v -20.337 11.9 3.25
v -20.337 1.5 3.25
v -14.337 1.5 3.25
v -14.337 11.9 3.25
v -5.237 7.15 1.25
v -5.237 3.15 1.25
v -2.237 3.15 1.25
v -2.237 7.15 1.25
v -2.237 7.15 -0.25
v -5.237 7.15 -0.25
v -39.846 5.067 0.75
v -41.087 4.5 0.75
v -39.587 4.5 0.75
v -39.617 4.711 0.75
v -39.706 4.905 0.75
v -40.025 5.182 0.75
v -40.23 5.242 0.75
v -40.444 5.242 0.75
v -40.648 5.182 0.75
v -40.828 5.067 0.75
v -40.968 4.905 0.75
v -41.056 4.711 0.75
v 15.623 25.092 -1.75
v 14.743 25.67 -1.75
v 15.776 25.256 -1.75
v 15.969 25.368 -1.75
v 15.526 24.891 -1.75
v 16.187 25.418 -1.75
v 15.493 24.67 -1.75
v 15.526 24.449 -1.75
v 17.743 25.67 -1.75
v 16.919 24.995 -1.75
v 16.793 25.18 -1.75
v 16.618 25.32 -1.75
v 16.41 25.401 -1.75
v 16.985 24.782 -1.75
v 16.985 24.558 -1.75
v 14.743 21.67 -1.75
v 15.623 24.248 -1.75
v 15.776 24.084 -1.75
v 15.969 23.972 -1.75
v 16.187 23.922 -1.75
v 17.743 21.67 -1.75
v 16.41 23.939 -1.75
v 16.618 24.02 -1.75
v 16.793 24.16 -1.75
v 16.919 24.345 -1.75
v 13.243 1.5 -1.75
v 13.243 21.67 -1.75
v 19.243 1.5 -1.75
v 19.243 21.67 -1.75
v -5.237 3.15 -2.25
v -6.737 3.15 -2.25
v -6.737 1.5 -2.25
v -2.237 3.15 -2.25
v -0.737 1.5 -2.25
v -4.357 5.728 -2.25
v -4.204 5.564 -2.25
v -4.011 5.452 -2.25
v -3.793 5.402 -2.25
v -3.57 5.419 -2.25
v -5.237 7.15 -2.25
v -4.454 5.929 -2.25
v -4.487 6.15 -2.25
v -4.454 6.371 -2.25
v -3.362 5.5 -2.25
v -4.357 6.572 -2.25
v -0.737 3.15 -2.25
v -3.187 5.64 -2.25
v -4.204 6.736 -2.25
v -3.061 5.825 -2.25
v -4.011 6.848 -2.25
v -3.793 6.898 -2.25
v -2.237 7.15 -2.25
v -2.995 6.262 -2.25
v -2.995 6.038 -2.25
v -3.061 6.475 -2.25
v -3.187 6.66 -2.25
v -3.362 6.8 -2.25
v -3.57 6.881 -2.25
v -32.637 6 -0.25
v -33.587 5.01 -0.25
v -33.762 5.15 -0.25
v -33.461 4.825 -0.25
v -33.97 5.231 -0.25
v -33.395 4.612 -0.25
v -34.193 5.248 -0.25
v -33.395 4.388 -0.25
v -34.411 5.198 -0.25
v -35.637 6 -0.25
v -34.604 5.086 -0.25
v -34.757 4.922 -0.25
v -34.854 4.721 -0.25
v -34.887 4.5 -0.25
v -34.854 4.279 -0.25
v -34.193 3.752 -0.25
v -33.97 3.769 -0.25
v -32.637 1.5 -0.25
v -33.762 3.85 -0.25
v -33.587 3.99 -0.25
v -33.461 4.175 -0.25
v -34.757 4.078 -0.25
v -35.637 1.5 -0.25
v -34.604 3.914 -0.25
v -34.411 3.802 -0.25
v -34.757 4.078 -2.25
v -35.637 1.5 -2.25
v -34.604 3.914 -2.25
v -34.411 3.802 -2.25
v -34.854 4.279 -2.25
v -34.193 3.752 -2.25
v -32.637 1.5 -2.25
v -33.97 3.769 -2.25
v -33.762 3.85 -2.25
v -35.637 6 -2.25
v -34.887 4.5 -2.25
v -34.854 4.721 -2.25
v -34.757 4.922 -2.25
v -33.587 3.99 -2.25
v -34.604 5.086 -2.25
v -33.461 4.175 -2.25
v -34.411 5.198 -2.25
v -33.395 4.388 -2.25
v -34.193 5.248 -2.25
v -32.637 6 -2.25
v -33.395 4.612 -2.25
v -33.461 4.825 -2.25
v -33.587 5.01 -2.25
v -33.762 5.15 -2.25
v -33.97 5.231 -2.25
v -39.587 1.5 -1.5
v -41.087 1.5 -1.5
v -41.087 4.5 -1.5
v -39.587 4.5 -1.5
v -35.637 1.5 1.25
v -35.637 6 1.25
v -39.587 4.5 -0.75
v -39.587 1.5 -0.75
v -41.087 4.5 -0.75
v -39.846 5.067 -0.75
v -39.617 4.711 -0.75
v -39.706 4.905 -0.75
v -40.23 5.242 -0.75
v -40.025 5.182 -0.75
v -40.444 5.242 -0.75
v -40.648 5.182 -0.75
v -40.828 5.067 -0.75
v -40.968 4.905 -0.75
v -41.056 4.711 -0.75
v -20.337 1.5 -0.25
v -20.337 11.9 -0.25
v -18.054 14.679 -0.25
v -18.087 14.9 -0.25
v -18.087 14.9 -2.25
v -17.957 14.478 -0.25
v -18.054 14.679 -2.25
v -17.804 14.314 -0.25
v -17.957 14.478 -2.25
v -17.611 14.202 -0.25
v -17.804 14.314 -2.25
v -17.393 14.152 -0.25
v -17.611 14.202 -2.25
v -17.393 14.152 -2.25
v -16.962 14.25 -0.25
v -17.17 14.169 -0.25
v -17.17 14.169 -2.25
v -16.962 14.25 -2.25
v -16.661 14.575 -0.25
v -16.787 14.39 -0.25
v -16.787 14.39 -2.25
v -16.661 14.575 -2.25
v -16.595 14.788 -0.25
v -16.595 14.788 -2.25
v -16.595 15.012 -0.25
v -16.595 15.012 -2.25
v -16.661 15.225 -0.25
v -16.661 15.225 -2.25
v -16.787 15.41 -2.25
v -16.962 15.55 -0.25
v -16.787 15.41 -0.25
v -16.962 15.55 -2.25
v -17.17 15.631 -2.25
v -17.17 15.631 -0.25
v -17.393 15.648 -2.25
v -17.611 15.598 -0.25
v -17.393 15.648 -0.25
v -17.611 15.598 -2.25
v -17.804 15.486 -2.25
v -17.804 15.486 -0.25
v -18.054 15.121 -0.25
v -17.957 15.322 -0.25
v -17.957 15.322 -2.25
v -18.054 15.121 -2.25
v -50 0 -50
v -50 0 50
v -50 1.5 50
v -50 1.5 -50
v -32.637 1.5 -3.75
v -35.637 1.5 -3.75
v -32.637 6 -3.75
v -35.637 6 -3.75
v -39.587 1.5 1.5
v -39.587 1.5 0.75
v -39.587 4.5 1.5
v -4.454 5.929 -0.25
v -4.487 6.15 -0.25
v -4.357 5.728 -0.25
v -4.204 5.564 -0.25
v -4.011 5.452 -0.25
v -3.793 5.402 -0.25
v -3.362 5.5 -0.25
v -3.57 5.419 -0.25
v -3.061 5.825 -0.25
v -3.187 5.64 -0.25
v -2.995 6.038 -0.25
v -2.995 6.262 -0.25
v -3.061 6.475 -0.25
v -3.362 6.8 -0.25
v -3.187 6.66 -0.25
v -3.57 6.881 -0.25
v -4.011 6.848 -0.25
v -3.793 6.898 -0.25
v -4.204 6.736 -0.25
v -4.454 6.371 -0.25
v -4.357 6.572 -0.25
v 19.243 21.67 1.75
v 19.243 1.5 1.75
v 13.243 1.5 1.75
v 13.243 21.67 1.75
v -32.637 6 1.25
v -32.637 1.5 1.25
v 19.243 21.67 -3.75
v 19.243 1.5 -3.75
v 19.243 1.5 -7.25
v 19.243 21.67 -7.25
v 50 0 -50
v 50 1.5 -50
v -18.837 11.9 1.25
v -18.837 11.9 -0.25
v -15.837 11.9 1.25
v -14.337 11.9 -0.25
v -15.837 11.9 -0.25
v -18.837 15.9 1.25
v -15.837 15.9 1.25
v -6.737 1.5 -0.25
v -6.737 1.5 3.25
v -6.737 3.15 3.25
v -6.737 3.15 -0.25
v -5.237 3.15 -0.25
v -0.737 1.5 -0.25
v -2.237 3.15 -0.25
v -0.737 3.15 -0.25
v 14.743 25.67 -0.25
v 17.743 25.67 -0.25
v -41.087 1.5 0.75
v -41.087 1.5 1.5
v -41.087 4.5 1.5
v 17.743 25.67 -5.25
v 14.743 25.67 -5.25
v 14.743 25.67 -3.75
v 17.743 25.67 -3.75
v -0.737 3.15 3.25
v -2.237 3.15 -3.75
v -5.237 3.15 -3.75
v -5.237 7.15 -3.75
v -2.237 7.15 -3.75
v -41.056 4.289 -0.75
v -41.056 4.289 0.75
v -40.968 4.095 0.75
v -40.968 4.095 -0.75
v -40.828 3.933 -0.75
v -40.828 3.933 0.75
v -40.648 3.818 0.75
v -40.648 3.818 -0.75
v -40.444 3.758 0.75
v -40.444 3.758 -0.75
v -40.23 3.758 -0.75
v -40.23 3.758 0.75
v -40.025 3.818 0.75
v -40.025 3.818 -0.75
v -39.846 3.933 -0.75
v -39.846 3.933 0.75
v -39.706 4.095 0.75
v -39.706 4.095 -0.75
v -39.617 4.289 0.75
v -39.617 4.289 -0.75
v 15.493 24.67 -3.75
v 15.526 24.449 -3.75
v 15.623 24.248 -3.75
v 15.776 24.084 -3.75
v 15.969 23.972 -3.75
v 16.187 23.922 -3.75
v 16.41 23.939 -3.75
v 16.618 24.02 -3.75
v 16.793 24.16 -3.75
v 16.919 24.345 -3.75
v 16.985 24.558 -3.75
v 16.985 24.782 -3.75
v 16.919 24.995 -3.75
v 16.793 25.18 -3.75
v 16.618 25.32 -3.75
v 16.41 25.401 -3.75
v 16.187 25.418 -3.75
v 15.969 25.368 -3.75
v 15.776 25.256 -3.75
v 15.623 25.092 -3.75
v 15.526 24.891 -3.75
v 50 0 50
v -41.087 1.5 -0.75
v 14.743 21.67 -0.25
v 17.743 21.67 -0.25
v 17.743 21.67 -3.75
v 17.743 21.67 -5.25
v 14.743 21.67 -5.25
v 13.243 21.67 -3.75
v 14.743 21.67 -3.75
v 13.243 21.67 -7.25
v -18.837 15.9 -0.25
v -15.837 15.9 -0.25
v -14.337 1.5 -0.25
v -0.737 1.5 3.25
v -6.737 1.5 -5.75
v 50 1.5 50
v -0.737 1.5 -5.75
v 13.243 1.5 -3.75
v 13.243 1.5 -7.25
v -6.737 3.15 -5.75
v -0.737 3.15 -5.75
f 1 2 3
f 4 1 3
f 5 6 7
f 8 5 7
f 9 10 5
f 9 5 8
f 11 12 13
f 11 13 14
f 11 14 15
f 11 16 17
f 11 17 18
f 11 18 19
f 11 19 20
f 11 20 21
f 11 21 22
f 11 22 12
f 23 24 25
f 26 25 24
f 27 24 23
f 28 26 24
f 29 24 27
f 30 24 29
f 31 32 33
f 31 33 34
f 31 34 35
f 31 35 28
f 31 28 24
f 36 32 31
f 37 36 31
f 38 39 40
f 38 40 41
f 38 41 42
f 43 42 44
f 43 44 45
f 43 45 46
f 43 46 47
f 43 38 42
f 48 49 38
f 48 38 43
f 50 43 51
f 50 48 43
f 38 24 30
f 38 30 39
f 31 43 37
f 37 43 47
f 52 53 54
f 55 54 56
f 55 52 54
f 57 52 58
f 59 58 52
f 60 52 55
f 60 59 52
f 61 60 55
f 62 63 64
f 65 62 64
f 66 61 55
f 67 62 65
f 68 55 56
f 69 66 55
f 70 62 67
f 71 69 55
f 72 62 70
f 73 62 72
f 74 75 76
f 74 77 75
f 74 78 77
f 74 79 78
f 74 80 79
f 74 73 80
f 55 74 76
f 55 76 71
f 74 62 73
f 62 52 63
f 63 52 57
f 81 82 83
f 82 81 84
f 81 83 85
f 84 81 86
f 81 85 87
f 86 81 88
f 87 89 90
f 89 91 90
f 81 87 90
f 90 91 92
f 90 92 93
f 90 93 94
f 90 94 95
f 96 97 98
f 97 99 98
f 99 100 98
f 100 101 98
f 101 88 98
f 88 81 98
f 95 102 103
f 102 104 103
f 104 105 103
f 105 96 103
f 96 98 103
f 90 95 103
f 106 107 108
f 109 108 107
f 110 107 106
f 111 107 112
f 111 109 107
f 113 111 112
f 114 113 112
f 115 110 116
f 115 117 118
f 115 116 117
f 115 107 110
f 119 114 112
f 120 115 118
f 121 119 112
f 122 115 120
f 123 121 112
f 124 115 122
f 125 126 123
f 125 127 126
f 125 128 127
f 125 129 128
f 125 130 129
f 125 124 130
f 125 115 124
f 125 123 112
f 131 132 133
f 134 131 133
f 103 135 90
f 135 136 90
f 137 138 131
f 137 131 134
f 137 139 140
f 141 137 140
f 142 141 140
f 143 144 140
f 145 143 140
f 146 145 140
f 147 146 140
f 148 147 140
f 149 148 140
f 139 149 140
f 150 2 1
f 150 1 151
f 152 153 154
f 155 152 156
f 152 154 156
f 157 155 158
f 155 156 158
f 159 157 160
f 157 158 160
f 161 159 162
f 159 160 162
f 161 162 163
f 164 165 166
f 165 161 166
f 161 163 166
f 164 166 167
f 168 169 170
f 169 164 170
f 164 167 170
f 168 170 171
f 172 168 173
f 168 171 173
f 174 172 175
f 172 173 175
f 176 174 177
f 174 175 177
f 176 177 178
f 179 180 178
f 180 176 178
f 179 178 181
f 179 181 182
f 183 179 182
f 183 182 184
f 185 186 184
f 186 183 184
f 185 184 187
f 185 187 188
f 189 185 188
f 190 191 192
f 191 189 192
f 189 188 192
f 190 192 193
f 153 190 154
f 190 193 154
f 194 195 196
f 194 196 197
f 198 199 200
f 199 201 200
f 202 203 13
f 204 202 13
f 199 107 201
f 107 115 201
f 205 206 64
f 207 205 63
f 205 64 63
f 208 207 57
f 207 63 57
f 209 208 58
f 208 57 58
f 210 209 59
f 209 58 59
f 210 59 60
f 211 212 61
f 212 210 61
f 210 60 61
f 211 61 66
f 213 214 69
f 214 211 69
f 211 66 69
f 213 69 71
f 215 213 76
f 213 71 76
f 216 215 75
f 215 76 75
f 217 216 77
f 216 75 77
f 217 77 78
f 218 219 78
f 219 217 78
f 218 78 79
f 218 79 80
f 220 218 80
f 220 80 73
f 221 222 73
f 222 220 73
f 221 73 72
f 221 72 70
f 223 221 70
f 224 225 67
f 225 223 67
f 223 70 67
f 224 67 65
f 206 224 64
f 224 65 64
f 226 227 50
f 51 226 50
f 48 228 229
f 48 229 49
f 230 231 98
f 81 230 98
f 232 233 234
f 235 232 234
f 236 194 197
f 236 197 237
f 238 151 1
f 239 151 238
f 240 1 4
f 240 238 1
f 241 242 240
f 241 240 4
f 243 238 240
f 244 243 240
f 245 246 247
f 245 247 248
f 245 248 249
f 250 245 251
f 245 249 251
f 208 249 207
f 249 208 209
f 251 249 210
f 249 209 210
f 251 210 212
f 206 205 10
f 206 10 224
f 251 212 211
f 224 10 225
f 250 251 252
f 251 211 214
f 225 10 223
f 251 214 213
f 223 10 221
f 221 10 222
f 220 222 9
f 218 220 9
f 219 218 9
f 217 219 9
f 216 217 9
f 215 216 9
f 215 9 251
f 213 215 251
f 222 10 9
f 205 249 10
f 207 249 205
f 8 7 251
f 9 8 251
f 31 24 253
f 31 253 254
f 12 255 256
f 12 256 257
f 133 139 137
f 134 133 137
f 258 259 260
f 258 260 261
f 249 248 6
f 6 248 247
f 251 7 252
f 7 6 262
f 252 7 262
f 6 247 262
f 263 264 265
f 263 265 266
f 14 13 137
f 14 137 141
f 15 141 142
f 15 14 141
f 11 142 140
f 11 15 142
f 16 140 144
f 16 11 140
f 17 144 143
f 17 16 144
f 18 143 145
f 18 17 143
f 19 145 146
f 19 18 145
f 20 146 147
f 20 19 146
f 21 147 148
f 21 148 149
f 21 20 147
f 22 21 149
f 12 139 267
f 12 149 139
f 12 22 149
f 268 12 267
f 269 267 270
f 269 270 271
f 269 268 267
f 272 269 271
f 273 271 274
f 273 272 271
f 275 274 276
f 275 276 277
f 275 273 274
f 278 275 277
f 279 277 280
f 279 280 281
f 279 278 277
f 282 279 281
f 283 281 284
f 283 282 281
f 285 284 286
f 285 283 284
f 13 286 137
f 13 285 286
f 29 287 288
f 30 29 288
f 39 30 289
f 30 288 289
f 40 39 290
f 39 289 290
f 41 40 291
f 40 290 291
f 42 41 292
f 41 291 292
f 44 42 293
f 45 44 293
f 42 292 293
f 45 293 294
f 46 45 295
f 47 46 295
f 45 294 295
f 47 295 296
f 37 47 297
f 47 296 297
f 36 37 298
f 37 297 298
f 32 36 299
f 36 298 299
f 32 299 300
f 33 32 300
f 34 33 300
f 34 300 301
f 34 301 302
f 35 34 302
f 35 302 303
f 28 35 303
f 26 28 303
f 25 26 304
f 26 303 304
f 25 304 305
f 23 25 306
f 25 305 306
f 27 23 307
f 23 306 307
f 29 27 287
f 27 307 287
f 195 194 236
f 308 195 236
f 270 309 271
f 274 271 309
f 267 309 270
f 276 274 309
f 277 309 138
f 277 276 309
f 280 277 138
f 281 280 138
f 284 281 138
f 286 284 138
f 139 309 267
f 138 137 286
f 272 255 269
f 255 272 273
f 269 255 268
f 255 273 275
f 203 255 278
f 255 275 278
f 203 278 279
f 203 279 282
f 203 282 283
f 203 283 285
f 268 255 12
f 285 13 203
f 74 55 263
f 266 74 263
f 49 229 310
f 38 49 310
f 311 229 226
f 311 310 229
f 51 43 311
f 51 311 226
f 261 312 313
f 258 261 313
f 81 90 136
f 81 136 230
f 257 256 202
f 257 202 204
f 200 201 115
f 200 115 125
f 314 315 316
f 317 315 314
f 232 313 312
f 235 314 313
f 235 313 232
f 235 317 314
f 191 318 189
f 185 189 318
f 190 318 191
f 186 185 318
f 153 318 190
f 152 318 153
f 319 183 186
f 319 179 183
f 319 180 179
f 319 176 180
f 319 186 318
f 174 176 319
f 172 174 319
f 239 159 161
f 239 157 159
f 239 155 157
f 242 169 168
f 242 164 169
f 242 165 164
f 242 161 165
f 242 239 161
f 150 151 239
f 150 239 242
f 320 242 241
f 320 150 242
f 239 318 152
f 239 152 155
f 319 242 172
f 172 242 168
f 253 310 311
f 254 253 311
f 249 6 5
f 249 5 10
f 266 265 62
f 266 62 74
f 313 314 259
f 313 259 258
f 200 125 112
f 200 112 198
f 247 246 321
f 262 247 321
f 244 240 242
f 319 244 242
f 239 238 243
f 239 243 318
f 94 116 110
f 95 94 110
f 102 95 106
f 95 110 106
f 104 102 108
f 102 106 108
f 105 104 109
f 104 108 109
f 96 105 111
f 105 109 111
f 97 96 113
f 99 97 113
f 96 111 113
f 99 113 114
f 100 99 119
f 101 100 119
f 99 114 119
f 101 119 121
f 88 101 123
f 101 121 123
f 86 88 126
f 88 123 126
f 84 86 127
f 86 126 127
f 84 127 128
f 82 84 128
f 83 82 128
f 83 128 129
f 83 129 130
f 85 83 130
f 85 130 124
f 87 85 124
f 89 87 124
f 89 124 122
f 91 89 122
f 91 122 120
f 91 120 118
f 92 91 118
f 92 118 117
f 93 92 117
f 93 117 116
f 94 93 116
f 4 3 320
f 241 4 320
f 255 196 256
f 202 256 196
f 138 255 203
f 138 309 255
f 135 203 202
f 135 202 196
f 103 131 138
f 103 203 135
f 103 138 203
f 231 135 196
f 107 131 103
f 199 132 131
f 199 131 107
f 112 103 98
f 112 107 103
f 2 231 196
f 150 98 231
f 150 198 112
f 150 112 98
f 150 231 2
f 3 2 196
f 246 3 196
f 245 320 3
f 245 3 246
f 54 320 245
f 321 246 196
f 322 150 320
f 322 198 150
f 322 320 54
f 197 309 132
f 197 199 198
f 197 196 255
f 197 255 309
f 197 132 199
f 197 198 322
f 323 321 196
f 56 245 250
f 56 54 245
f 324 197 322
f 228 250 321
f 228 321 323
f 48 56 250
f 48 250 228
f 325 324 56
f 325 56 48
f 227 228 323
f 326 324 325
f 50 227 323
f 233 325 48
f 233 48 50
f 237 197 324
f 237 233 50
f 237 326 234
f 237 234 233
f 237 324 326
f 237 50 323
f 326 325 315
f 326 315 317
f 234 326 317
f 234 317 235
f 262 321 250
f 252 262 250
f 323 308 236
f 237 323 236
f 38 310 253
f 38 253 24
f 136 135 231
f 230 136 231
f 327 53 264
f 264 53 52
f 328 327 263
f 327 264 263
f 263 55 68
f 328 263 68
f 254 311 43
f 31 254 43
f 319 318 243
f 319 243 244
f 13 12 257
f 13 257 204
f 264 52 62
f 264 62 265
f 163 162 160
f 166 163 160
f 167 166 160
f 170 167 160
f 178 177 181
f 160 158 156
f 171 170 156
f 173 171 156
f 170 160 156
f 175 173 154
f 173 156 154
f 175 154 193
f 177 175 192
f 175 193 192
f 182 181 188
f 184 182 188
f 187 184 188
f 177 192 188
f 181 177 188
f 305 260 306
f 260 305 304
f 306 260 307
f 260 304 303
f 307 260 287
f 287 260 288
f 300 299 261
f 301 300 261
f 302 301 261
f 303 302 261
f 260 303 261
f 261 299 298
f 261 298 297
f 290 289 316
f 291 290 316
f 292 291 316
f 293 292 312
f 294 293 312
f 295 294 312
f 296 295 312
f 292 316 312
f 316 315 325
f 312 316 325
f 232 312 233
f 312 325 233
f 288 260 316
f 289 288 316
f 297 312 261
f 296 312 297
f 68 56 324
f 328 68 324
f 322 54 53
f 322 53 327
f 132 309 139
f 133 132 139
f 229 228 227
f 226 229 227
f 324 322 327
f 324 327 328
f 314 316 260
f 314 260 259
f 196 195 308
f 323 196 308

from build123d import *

# Parameters (mm, degrees)
SKETCH_1_W             = 100
SKETCH_1_H             = 100
EXTRUDE_1_DEPTH        = 1.5
SKETCH_2_R             = 0.75
EXTRUDE_2_DEPTH        = 0.75
SKETCH_3_W             = 1.5
SKETCH_3_H             = 3
EXTRUDE_3_DEPTH        = 1.5
SKETCH_5_W             = 3
SKETCH_5_H             = 1.5
EXTRUDE_4_DEPTH        = 3
SKETCH_7_R             = 0.75
EXTRUDE_5_DEPTH        = 2.5
SKETCH_8_W             = 6
SKETCH_8_H             = 9
EXTRUDE_6_DEPTH        = 10.4
SKETCH_9_W             = 3
SKETCH_9_H             = 1.5
EXTRUDE_7_DEPTH        = 4
SKETCH_10_R            = 0.75
EXTRUDE_8_DEPTH        = 3
SKETCH_11_W            = 6
SKETCH_11_H            = 2
CUT_EXTRUDE_1_DEPTH    = 10.4
SKETCH_12_W            = 6
SKETCH_12_H            = 3.5
EXTRUDE_9_DEPTH        = 20.17
SKETCH_13_W            = 3
SKETCH_13_H            = 1.5
EXTRUDE_10_DEPTH       = 4
SKETCH_14_R            = 0.75
EXTRUDE_11_DEPTH       = 2
PATTERN_LINEAR_2_COUNT = 2
PATTERN_LINEAR_2_PITCH = 13.6
SKETCH_16_W            = 6
SKETCH_16_H            = 8.75
CUT_EXTRUDE_2_DEPTH    = 9.25
SKETCH_17_W            = 6
SKETCH_17_H            = 2
CUT_EXTRUDE_3_DEPTH    = 1.65
SKETCH_18_W            = 3
SKETCH_18_H            = 1.5
EXTRUDE_12_DEPTH       = 4
SKETCH_19_R            = 0.75
EXTRUDE_13_DEPTH       = 3
EXTRUDE_14_DEPTH       = 1.5
SKETCH_21_W            = 0.75
SKETCH_21_H            = 3
CUT_EXTRUDE_4_DEPTH    = 1.5
SKETCH_22_W            = 1.5
SKETCH_22_H            = 0.5
EXTRUDE_15_DEPTH       = 2.5
SKETCH_23_W            = 3.5
SKETCH_23_H            = 14.4
CUT_EXTRUDE_5_DEPTH    = 6


with BuildPart() as part:
    # 草圖1 → 填料-伸長1 (new body)
    with BuildSketch(Plane(origin=(0, 0, 0), x_dir=(1, 0, 0), z_dir=(0, 1, 0))):
        Rectangle(SKETCH_1_W, SKETCH_1_H)
    extrude(amount=EXTRUDE_1_DEPTH)



with BuildPart() as body_2:
    # 草圖2 → 填料-伸長2 (new, symmetric)
    with BuildSketch(Plane.XY):
        with Locations((-40.336831864, 4.5)):
            Circle(SKETCH_2_R)
    extrude(amount=EXTRUDE_2_DEPTH, both=True)


with BuildPart() as part_1:
    add(part.part)

    add(body_2.part)  # 填料-伸長3 merges body 2
    # 草圖3 → 填料-伸長3 (add)
    with BuildSketch(Plane.XY.offset(0.75)):
        with Locations((-40.336831864, 3)):
            Rectangle(SKETCH_3_W, SKETCH_3_H)
    extrude_3 = extrude(amount=EXTRUDE_3_DEPTH)

    # 鏡射1: 填料-伸長3 across plane
    add(extrude_3.mirror(Plane.XY))

    # 草圖5 → 填料-伸長4 (add)
    with BuildSketch(Plane(origin=(0, 4.5, 0), x_dir=(1, 0, 0), z_dir=(0, 1, 0))):
        with Locations((-34.136831864, -0.5)):
            Rectangle(SKETCH_5_W, SKETCH_5_H)
        with Locations((-34.136831864, 3)):
            Rectangle(SKETCH_5_W, SKETCH_5_H)
    extrude(amount=-EXTRUDE_4_DEPTH)

    # 草圖7 → 填料-伸長5 (add)
    with BuildSketch(Plane.XY.offset(-2.25)):
        with Locations(Location((-34.136831864, 4.5, 0), (0, 0, 180))):
            Circle(SKETCH_7_R)
    extrude(amount=EXTRUDE_5_DEPTH)

    # 草圖8 → 填料-伸長6 (add)
    with BuildSketch(Plane(origin=(0, 1.5, 0), x_dir=(1, 0, 0), z_dir=(0, 1, 0))):
        with Locations((-17.336831864, 1.25)):
            Rectangle(SKETCH_8_W, SKETCH_8_H)
    extrude_6 = extrude(amount=EXTRUDE_6_DEPTH)

    # 草圖9 → 填料-伸長7 (add)
    with BuildSketch(Plane(origin=(0, 11.9, 0), x_dir=(1, 0, 0), z_dir=(0, 1, 0))):
        with Locations((-17.336831864, 3)):
            Rectangle(SKETCH_9_W, SKETCH_9_H)
        with Locations((-17.336831864, -0.5)):
            Rectangle(SKETCH_9_W, SKETCH_9_H)
    extrude(amount=EXTRUDE_7_DEPTH)

    # 草圖10 → 填料-伸長8 (add)
    with BuildSketch(Plane.XY.offset(-2.25)):
        with Locations(Location((-17.336831864, 14.9, 0), (0, 0, 180))):
            Circle(SKETCH_10_R)
    extrude(amount=EXTRUDE_8_DEPTH)

    # 草圖11 → 除料-伸長1 (cut)
    with BuildSketch(Plane(origin=(0, 11.9, 0), x_dir=(1, 0, 0), z_dir=(0, 1, 0))):
        with Locations((-17.336831864, 1.25)):
            Rectangle(SKETCH_11_W, SKETCH_11_H)
    extrude(amount=-CUT_EXTRUDE_1_DEPTH, mode=Mode.SUBTRACT)

    # 草圖12 → 填料-伸長9 (add)
    with BuildSketch(Plane(origin=(0, 1.5, 0), x_dir=(1, 0, 0), z_dir=(0, 1, 0))):
        with Locations((16.243168136, 0)):
            Rectangle(SKETCH_12_W, SKETCH_12_H)
        with Locations((16.243168136, 5.5)):
            Rectangle(SKETCH_12_W, SKETCH_12_H)
    extrude(amount=EXTRUDE_9_DEPTH)

    # 草圖13 → 填料-伸長10 (add)
    with BuildSketch(Plane(origin=(0, 21.67, 0), x_dir=(1, 0, 0), z_dir=(0, 1, 0))):
        with Locations((16.243168136, 1)):
            Rectangle(SKETCH_13_W, SKETCH_13_H)
        with Locations((16.243168136, 4.5)):
            Rectangle(SKETCH_13_W, SKETCH_13_H)
    extrude(amount=EXTRUDE_10_DEPTH)

    # 草圖14 → 填料-伸長11 (add)
    with BuildSketch(Plane.XY.offset(-3.75)):
        with Locations(Location((16.243168136, 24.67, 0), (0, 0, 180))):
            Circle(SKETCH_14_R)
    extrude(amount=EXTRUDE_11_DEPTH)

    # 直線複製排列2: 填料-伸長6 ×2
    with Locations(*[(i * PATTERN_LINEAR_2_PITCH, 0, 0) for i in range(1, PATTERN_LINEAR_2_COUNT)]):
        add(extrude_6)

    # 草圖16 → 除料-伸長2 (cut, symmetric)
    with BuildSketch(Plane.XY):
        with Locations((-3.736831864, 7.525)):
            Rectangle(SKETCH_16_W, SKETCH_16_H)
    extrude(amount=CUT_EXTRUDE_2_DEPTH, both=True, mode=Mode.SUBTRACT)

    # 草圖17 → 除料-伸長3 (cut)
    with BuildSketch(Plane(origin=(0, 3.15, 0), x_dir=(1, 0, 0), z_dir=(0, 1, 0))):
        with Locations((-3.736831864, 1.25)):
            Rectangle(SKETCH_17_W, SKETCH_17_H)
    extrude(amount=-CUT_EXTRUDE_3_DEPTH, mode=Mode.SUBTRACT)

    # 草圖18 → 填料-伸長12 (add)
    with BuildSketch(Plane(origin=(0, 3.15, 0), x_dir=(1, 0, 0), z_dir=(0, 1, 0))):
        with Locations((-3.736831864, 3)):
            Rectangle(SKETCH_18_W, SKETCH_18_H)
        with Locations((-3.736831864, -0.5)):
            Rectangle(SKETCH_18_W, SKETCH_18_H)
    extrude(amount=EXTRUDE_12_DEPTH)

    # 草圖19 → 填料-伸長13 (add)
    with BuildSketch(Plane.XY.offset(-2.25)):
        with Locations(Location((-3.736831864, 6.15, 0), (0, 0, 180))):
            Circle(SKETCH_19_R)
    extrude(amount=EXTRUDE_13_DEPTH)

    # 草圖20 → 填料-伸長14 (add)
    with BuildSketch(Plane(origin=(0, 4.5, 0), x_dir=(1, 0, 0), z_dir=(0, 1, 0))):
        Polygon((-32.636831864, 0.25), (-33.386831864, 0.25), (-33.386831864, -0.25), (-34.886831864, -0.25), (-34.886831864, 0.25), (-35.636831864, 0.25), (-35.636831864, -1.25), (-32.636831864, -1.25), align=None)
        Polygon((-35.636831864, 3.75), (-35.636831864, 2.25), (-34.886831864, 2.25), (-33.386831864, 2.25), (-32.636831864, 2.25), (-32.636831864, 3.75), align=None)
    extrude(amount=EXTRUDE_14_DEPTH)

    # 草圖21 → 除料-伸長4 (cut)
    with BuildSketch(Plane.ZY.offset(41.086831864)):
        with Locations((1.875, 3)):
            Rectangle(SKETCH_21_W, SKETCH_21_H)
        with Locations((-1.875, 3)):
            Rectangle(SKETCH_21_W, SKETCH_21_H)
    extrude(amount=-CUT_EXTRUDE_4_DEPTH, mode=Mode.SUBTRACT)

    # 草圖22 → 填料-伸長15 (add)
    with BuildSketch(Plane(origin=(0, 6, 0), x_dir=(1, 0, 0), z_dir=(0, 1, 0))):
        with Locations((-34.136831864, 0)):
            Rectangle(SKETCH_22_W, SKETCH_22_H)
    extrude(amount=-EXTRUDE_15_DEPTH)

    # 草圖23 → 除料-伸長5 (cut)
    with BuildSketch(Plane.ZY.offset(20.336831864)):
        with Locations((-4, 8.7)):
            Rectangle(SKETCH_23_W, SKETCH_23_H)
    extrude(amount=-CUT_EXTRUDE_5_DEPTH, mode=Mode.SUBTRACT)


solid = part_1.part
